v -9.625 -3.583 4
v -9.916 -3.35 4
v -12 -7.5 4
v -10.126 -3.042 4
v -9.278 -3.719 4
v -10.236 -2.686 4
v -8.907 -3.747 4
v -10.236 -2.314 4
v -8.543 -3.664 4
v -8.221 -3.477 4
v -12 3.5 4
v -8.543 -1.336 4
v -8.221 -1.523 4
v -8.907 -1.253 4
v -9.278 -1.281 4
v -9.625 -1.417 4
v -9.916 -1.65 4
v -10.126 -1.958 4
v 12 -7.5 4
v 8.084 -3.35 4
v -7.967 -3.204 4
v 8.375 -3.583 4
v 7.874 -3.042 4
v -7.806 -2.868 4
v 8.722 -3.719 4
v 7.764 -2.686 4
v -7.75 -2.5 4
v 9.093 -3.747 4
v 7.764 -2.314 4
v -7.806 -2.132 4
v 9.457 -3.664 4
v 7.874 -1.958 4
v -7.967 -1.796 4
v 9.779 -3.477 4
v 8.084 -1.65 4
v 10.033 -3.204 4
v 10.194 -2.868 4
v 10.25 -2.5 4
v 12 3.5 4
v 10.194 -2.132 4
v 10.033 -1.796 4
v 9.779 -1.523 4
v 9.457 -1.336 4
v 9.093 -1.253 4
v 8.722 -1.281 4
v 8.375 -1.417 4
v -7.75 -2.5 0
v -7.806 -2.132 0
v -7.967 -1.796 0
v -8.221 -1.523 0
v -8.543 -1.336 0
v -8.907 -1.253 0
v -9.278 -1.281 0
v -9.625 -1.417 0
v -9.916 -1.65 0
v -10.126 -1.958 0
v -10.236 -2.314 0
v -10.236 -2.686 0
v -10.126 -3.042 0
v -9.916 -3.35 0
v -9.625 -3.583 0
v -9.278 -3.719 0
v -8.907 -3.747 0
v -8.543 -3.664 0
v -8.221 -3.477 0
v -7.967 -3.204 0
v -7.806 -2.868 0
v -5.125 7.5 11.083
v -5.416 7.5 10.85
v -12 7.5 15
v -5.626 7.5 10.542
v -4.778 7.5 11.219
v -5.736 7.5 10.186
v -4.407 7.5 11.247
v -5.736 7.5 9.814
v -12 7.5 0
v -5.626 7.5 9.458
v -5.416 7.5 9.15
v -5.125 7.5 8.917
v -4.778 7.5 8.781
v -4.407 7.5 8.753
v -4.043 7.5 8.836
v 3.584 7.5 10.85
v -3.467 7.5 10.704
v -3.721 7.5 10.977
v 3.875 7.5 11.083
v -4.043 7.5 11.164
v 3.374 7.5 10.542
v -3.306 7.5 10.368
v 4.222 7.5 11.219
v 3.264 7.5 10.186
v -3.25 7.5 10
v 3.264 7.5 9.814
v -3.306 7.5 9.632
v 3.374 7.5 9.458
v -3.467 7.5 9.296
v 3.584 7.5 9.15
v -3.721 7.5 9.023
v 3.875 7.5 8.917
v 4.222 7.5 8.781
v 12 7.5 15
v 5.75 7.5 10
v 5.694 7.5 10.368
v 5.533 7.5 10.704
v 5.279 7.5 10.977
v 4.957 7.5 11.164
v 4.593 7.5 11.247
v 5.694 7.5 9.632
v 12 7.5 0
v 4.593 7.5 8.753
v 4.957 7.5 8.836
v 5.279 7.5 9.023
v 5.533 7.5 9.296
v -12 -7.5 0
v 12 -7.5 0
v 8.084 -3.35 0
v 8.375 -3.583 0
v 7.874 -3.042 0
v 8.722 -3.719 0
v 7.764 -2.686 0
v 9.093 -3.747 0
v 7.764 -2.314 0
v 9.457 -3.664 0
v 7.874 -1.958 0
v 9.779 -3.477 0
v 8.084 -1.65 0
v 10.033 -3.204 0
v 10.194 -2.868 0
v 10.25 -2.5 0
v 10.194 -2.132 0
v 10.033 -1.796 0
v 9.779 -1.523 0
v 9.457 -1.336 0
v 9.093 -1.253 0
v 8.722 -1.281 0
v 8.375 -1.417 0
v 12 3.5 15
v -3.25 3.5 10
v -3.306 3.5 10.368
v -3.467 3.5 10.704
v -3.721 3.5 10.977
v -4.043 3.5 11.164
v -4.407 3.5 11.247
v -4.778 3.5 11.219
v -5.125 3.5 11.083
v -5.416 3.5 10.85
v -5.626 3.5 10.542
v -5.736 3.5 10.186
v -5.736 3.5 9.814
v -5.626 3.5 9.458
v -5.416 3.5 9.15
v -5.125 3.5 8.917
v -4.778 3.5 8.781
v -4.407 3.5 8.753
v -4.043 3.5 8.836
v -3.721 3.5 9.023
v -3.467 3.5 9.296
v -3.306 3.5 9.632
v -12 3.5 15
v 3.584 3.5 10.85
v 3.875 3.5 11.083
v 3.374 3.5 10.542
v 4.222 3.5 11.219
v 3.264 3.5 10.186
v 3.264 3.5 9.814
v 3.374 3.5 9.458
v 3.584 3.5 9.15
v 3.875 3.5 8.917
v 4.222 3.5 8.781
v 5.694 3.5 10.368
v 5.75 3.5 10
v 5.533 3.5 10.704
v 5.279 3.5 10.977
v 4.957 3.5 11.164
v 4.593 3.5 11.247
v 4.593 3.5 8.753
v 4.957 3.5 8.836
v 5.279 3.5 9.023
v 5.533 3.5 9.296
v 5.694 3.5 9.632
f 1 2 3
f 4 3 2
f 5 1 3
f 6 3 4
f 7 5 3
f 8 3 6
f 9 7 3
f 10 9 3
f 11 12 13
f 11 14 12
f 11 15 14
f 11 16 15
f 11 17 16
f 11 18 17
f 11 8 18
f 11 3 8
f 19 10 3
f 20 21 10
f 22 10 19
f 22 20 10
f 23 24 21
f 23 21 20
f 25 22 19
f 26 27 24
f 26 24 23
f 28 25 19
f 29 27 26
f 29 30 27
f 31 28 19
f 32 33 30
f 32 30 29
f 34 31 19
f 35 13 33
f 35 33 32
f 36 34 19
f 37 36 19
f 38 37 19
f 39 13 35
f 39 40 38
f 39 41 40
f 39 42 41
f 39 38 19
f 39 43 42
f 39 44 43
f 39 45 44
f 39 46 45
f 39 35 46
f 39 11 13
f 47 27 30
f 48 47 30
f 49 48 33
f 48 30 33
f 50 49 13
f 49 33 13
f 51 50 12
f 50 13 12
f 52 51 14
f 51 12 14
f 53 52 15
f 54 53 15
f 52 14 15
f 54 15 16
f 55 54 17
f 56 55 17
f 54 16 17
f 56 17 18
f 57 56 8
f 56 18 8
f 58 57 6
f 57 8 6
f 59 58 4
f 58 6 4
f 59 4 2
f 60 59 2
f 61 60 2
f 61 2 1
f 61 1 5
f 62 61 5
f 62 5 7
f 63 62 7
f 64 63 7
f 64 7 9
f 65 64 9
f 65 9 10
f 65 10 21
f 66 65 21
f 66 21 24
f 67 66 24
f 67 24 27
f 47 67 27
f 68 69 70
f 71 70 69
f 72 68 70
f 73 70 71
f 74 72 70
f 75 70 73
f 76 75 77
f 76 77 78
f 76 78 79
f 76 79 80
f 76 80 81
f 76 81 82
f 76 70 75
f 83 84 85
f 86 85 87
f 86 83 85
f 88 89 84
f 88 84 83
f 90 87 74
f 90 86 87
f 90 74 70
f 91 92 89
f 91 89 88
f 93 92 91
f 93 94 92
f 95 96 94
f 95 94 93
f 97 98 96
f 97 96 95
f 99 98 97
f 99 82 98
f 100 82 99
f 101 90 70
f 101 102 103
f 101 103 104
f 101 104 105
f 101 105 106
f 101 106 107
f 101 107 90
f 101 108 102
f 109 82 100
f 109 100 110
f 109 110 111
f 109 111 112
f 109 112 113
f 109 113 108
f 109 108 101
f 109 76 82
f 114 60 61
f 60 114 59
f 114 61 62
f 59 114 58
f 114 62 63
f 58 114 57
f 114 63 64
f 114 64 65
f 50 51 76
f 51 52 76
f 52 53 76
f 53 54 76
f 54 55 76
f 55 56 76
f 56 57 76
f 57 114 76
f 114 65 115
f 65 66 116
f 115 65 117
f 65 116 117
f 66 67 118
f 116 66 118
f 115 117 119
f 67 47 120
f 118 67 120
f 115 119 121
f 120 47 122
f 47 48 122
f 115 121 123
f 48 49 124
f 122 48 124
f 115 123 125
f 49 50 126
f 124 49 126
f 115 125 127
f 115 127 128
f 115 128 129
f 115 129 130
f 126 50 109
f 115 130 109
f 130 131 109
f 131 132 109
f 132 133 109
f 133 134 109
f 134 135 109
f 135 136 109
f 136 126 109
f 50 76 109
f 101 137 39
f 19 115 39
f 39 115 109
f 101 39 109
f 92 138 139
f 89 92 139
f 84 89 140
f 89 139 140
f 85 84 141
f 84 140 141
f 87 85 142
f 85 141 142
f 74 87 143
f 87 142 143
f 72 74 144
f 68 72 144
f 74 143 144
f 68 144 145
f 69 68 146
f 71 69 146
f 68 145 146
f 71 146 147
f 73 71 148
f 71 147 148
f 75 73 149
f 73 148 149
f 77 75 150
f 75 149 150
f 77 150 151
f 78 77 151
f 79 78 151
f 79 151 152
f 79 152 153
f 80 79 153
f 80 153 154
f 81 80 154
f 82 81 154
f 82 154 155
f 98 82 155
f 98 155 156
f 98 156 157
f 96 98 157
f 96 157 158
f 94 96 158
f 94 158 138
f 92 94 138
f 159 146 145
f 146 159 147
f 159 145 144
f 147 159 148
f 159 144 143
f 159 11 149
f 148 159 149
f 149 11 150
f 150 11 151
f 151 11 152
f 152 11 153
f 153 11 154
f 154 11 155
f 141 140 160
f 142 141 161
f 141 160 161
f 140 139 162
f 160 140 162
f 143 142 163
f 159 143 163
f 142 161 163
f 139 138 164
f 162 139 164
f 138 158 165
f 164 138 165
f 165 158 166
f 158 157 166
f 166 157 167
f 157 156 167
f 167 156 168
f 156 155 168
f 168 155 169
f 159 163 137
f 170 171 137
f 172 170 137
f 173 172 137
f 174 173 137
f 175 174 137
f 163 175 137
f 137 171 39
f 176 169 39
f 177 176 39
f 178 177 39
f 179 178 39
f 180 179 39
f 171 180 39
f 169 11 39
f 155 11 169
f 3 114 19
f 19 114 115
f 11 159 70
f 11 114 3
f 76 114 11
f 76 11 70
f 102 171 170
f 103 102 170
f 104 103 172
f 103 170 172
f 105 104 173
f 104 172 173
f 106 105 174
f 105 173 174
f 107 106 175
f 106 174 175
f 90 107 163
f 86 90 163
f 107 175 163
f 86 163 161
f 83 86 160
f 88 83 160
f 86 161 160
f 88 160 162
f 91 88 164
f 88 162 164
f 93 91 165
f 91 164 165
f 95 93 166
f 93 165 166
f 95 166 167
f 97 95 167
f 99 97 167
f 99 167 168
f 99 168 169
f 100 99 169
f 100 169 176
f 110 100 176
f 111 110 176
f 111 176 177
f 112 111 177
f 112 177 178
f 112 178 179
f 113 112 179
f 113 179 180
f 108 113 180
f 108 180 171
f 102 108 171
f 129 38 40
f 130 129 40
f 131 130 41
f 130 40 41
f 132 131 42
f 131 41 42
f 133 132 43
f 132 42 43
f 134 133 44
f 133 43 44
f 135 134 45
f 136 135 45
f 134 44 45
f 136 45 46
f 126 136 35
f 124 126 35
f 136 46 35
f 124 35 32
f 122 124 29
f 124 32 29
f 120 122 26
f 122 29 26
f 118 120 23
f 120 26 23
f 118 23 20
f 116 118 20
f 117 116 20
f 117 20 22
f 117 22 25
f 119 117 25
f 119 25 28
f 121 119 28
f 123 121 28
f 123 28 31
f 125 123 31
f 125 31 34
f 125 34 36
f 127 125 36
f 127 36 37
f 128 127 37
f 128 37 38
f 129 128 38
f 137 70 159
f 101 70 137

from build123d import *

# Parameters (mm, degrees)
SKETCH_1_W          = 24
SKETCH_1_H          = 15
EXTRUDE_1_DEPTH     = 4
SKETCH_2_W          = 24
SKETCH_2_H          = 4
EXTRUDE_2_DEPTH     = 11
SKETCH_3_R          = 1.25
CUT_EXTRUDE_1_DEPTH = 5
SKETCH_4_R          = 1.25
CUT_EXTRUDE_2_DEPTH = 5


with BuildPart() as part:
    # 草图1 → 凸台-拉伸1 (new body)
    with BuildSketch(Plane.XY):
        Rectangle(SKETCH_1_W, SKETCH_1_H)
    extrude(amount=EXTRUDE_1_DEPTH)

    # 草图2 → 凸台-拉伸2 (add)
    with BuildSketch(Plane.XY.offset(4)):
        with Locations((0, 5.5)):
            Rectangle(SKETCH_2_W, SKETCH_2_H)
    extrude(amount=EXTRUDE_2_DEPTH)

    # 草图3 → 切除-拉伸1 (cut, through all)
    with BuildSketch(Plane.XY.offset(4)):
        with Locations((-9, -2.5)):
            Circle(SKETCH_3_R)
        with Locations((9, -2.5)):
            Circle(SKETCH_3_R)
    extrude(amount=-CUT_EXTRUDE_1_DEPTH, mode=Mode.SUBTRACT)

    # 草图4 → 切除-拉伸2 (cut, through all)
    with BuildSketch(Plane.XZ.offset(-3.5)):
        with Locations((-4.5, 10)):
            Circle(SKETCH_4_R)
        with Locations((4.5, 10)):
            Circle(SKETCH_4_R)
    extrude(amount=-CUT_EXTRUDE_2_DEPTH, mode=Mode.SUBTRACT)


solid = part.part
